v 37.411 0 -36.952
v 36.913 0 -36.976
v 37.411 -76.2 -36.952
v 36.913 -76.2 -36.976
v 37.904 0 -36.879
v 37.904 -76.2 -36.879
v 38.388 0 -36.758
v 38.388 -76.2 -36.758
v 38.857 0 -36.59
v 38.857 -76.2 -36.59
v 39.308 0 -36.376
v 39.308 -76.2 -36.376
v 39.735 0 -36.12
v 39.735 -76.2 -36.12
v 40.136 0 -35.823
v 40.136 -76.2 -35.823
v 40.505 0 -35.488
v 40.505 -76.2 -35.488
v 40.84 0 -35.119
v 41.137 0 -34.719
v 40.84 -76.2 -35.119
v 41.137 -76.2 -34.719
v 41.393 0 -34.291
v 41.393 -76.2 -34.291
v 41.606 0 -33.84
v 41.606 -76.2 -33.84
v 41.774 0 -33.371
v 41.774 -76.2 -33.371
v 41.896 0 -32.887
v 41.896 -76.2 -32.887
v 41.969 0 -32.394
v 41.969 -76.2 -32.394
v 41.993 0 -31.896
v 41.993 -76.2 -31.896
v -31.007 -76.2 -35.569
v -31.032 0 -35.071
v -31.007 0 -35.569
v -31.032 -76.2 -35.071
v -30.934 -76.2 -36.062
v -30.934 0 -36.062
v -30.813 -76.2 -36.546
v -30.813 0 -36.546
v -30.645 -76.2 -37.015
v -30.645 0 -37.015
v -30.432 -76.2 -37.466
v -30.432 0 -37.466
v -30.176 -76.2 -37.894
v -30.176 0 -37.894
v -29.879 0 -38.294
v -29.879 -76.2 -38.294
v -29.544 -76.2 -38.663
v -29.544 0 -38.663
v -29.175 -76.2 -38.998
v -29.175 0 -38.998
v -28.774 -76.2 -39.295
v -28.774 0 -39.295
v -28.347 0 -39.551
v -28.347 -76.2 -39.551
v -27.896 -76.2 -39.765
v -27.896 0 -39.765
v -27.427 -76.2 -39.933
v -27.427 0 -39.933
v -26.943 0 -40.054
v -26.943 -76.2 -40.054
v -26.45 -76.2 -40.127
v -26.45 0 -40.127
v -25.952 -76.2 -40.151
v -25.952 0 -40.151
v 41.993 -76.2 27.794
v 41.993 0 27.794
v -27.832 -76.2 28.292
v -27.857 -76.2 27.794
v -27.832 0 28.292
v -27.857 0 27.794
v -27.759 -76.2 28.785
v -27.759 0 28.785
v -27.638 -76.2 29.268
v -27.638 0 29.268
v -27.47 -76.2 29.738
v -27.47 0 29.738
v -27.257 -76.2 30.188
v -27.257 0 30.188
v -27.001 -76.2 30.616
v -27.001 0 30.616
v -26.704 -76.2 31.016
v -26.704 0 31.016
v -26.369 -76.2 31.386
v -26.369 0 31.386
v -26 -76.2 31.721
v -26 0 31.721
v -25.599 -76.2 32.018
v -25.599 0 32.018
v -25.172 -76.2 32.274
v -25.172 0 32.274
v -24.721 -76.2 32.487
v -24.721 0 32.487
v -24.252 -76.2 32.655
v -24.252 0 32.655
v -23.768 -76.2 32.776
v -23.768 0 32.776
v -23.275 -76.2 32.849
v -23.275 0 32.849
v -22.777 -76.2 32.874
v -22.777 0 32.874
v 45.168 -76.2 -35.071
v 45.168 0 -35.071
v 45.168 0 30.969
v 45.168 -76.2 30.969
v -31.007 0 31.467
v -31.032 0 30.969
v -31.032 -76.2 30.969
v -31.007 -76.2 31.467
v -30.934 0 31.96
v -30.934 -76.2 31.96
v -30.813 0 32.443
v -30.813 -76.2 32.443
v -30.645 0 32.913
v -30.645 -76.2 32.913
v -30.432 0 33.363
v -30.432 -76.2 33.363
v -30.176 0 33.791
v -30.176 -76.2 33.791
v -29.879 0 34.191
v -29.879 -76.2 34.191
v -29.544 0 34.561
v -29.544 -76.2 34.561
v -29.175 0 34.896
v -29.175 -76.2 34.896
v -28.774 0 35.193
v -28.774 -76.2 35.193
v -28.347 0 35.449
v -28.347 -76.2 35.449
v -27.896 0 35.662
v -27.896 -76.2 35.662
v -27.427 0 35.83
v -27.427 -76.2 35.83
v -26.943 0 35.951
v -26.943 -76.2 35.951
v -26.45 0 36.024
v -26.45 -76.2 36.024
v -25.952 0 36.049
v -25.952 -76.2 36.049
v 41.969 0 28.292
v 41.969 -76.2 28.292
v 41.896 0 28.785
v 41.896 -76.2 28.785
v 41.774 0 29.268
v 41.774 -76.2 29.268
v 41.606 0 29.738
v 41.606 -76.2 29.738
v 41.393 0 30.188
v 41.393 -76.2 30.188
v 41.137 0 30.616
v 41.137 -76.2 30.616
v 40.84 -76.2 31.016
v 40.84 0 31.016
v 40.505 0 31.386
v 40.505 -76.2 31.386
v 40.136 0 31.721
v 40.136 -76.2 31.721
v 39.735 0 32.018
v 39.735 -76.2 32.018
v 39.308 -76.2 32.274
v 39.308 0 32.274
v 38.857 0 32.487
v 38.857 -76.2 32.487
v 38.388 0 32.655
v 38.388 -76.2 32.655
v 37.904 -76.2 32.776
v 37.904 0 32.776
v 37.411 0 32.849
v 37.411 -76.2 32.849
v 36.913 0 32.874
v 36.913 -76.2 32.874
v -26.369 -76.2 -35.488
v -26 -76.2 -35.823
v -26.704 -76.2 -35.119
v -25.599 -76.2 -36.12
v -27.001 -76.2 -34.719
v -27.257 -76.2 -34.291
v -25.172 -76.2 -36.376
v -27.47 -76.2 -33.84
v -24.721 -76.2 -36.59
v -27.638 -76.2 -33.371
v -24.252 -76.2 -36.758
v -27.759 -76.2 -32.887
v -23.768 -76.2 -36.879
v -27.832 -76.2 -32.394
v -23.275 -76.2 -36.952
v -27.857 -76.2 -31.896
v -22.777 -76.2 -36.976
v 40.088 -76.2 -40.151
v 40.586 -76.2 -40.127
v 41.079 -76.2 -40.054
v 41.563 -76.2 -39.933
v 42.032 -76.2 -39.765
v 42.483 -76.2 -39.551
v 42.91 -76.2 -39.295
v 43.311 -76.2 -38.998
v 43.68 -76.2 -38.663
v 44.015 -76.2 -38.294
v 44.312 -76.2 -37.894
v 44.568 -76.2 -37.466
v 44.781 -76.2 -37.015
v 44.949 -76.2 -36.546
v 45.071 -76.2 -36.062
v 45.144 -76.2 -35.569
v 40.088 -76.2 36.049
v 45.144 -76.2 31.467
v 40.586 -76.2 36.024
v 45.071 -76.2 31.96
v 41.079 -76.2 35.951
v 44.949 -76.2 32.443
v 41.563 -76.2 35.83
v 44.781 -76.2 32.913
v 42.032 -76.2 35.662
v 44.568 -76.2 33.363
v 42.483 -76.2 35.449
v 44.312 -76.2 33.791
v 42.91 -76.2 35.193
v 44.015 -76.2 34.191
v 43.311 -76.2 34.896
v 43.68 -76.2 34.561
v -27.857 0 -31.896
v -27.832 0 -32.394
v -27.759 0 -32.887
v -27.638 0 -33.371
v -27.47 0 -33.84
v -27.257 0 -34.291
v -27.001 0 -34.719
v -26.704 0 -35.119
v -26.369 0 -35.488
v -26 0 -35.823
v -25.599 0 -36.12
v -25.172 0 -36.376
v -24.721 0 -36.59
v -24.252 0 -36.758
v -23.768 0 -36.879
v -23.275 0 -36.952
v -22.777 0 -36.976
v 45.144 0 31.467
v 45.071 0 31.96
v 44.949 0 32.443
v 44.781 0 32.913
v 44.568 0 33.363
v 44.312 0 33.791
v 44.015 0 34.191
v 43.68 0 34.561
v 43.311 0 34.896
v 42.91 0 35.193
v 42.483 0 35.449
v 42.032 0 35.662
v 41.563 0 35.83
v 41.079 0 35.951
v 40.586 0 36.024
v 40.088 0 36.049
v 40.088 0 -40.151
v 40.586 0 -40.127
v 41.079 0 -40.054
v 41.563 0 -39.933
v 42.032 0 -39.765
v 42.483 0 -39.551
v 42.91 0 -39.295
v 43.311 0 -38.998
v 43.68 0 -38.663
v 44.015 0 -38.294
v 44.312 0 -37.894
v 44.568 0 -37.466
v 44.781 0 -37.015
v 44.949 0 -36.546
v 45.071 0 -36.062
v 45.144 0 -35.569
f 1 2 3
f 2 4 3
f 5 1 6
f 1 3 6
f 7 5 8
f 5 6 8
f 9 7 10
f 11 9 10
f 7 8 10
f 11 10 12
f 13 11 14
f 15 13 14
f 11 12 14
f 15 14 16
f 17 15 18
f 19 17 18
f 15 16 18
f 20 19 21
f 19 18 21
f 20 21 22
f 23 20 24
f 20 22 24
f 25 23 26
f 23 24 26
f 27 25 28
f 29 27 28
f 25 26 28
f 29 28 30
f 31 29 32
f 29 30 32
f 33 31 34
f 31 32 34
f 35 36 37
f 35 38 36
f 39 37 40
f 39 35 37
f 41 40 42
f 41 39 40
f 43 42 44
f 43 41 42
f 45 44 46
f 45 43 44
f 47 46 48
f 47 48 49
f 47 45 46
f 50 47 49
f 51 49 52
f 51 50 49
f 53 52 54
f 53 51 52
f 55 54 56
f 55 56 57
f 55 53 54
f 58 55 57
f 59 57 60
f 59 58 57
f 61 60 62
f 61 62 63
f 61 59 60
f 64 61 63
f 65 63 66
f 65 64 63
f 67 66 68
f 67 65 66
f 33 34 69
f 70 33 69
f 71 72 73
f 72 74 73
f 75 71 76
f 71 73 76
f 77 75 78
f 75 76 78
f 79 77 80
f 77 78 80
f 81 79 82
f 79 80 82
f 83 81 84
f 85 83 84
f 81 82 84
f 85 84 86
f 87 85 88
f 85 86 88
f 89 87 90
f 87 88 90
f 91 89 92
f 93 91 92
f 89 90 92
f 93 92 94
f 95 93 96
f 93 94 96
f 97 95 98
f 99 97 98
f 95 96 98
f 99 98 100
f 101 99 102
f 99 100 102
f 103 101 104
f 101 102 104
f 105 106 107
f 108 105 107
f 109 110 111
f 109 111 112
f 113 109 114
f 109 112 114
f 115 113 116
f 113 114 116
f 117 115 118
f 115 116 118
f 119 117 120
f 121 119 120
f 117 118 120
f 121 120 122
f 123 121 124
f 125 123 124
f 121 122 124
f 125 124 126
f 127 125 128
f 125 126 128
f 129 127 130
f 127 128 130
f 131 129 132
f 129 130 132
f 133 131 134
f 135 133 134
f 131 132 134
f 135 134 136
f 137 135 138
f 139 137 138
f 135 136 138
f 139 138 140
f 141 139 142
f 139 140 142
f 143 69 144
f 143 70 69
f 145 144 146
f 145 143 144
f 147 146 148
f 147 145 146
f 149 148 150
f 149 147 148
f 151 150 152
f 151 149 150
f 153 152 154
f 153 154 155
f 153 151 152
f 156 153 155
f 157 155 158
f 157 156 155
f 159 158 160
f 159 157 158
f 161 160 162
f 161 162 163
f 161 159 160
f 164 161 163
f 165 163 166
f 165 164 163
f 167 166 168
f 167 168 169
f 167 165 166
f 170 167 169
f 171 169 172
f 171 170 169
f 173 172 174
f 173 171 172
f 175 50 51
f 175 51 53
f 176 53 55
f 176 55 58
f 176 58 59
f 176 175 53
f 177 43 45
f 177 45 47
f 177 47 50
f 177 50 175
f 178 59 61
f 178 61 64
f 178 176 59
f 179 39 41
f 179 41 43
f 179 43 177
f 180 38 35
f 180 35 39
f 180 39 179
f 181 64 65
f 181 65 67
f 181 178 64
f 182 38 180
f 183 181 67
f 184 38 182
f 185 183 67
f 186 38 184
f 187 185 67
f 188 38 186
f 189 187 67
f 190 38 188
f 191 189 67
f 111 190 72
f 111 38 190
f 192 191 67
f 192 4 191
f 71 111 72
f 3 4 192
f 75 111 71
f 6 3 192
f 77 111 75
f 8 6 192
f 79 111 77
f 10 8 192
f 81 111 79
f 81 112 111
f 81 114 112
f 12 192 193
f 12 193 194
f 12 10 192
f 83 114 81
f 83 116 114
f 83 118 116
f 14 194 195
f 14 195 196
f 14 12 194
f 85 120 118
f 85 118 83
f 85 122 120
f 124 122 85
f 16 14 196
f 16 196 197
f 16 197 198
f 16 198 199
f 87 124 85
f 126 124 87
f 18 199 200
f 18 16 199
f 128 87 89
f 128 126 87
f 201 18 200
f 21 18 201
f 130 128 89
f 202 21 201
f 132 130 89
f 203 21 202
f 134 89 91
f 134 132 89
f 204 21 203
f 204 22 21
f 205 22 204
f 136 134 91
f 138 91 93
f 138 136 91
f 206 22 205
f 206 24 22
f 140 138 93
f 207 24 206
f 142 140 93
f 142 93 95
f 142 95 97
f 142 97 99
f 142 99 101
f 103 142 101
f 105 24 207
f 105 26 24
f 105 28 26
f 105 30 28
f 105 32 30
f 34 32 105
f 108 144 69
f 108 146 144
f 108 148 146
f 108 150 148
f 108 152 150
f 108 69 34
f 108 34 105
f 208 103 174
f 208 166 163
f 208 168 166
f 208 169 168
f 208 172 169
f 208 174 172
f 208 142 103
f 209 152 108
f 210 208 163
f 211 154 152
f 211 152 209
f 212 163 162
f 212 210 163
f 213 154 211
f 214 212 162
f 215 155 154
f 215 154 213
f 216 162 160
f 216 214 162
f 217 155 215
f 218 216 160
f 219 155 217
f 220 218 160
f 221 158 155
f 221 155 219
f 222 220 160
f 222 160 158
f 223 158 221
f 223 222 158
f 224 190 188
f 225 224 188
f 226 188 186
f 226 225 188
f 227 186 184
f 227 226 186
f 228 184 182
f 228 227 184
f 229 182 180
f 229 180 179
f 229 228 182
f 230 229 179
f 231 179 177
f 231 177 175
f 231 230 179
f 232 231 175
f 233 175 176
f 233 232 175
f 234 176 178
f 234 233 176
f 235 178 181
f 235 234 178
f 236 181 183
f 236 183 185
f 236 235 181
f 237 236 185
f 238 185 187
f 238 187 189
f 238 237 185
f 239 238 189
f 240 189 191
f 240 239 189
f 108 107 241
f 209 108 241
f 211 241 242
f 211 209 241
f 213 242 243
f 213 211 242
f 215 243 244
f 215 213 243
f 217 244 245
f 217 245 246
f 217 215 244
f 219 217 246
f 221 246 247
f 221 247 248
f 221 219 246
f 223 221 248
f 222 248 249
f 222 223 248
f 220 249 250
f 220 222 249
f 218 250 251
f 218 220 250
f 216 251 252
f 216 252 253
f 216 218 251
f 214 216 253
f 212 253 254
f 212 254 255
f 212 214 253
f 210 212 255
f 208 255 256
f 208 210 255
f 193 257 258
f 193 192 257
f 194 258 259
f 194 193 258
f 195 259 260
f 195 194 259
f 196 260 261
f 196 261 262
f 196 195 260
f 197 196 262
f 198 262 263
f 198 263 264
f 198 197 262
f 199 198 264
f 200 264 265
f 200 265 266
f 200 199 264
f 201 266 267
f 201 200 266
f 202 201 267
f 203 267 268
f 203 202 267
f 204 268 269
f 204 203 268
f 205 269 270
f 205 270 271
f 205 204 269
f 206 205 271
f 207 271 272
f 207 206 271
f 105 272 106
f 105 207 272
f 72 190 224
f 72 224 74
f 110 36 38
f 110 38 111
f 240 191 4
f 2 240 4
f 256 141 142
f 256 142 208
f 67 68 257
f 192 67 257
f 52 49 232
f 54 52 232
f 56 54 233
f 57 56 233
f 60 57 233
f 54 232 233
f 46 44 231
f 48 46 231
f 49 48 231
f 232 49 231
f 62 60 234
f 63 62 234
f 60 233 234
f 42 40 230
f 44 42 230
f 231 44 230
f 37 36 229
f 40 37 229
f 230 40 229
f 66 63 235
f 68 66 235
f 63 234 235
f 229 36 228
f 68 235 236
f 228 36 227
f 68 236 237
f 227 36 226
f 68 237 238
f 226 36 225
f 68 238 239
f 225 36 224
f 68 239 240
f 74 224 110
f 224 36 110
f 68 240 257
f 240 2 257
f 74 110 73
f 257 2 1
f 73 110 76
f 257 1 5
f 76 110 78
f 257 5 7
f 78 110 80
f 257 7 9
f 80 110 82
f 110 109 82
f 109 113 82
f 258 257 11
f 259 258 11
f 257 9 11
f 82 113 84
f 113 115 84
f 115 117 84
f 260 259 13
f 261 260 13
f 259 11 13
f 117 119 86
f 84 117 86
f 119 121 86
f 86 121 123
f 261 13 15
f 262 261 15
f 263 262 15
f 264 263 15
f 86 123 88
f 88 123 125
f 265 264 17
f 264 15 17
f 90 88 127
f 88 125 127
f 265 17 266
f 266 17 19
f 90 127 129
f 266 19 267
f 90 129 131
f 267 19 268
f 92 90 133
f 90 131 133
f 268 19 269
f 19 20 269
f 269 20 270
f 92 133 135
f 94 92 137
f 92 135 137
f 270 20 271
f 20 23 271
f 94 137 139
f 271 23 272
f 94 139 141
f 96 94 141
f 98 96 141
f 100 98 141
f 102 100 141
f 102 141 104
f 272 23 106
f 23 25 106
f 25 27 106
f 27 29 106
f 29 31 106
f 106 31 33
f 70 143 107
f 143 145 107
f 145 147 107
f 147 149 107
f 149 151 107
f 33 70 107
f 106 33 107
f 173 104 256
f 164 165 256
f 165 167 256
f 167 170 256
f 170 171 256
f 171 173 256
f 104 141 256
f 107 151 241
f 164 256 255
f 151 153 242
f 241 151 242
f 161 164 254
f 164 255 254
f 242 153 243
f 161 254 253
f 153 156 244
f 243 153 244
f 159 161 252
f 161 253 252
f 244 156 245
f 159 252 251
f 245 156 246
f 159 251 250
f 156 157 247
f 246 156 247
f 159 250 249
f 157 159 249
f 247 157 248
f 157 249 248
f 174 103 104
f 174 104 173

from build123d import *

# Parameters (mm, degrees)
F0_W     = 76.2
F0_H     = 76.2
F1_DEPTH = 76.2
F2_T     = -3.175
F3_R     = 5.08


with BuildPart() as f1:
    # F0 (on Front) → F1 (new body)
    with BuildSketch(Plane.XZ):
        with Locations((7.068123761, -2.0512547344)):
            Rectangle(F0_W, F0_H)
    extrude(amount=F1_DEPTH)

    # F2
    f2_openings = [f1.faces().sort_by_distance(p)[0] for p in [
        (7.068124, -76.2, -2.051255),
        (7.068124, 0, -2.051255),
    ]]
    offset(amount=F2_T, openings=f2_openings)

    # F3
    f3_edges = [f1.edges().sort_by_distance(p)[0] for p in [
        (-27.856876, -38.1, 32.873745),
        (41.993124, -38.1, -36.976255),
        (41.993124, -38.1, 32.873745),
        (-31.031876, -38.1, -40.151255),
        (45.168124, -38.1, -40.151255),
        (45.168124, -38.1, 36.048745),
        (-31.031876, -38.1, 36.048745),
        (-27.856876, -38.1, -36.976255),
    ]]
    fillet(f3_edges, radius=F3_R)


solid = f1.part
